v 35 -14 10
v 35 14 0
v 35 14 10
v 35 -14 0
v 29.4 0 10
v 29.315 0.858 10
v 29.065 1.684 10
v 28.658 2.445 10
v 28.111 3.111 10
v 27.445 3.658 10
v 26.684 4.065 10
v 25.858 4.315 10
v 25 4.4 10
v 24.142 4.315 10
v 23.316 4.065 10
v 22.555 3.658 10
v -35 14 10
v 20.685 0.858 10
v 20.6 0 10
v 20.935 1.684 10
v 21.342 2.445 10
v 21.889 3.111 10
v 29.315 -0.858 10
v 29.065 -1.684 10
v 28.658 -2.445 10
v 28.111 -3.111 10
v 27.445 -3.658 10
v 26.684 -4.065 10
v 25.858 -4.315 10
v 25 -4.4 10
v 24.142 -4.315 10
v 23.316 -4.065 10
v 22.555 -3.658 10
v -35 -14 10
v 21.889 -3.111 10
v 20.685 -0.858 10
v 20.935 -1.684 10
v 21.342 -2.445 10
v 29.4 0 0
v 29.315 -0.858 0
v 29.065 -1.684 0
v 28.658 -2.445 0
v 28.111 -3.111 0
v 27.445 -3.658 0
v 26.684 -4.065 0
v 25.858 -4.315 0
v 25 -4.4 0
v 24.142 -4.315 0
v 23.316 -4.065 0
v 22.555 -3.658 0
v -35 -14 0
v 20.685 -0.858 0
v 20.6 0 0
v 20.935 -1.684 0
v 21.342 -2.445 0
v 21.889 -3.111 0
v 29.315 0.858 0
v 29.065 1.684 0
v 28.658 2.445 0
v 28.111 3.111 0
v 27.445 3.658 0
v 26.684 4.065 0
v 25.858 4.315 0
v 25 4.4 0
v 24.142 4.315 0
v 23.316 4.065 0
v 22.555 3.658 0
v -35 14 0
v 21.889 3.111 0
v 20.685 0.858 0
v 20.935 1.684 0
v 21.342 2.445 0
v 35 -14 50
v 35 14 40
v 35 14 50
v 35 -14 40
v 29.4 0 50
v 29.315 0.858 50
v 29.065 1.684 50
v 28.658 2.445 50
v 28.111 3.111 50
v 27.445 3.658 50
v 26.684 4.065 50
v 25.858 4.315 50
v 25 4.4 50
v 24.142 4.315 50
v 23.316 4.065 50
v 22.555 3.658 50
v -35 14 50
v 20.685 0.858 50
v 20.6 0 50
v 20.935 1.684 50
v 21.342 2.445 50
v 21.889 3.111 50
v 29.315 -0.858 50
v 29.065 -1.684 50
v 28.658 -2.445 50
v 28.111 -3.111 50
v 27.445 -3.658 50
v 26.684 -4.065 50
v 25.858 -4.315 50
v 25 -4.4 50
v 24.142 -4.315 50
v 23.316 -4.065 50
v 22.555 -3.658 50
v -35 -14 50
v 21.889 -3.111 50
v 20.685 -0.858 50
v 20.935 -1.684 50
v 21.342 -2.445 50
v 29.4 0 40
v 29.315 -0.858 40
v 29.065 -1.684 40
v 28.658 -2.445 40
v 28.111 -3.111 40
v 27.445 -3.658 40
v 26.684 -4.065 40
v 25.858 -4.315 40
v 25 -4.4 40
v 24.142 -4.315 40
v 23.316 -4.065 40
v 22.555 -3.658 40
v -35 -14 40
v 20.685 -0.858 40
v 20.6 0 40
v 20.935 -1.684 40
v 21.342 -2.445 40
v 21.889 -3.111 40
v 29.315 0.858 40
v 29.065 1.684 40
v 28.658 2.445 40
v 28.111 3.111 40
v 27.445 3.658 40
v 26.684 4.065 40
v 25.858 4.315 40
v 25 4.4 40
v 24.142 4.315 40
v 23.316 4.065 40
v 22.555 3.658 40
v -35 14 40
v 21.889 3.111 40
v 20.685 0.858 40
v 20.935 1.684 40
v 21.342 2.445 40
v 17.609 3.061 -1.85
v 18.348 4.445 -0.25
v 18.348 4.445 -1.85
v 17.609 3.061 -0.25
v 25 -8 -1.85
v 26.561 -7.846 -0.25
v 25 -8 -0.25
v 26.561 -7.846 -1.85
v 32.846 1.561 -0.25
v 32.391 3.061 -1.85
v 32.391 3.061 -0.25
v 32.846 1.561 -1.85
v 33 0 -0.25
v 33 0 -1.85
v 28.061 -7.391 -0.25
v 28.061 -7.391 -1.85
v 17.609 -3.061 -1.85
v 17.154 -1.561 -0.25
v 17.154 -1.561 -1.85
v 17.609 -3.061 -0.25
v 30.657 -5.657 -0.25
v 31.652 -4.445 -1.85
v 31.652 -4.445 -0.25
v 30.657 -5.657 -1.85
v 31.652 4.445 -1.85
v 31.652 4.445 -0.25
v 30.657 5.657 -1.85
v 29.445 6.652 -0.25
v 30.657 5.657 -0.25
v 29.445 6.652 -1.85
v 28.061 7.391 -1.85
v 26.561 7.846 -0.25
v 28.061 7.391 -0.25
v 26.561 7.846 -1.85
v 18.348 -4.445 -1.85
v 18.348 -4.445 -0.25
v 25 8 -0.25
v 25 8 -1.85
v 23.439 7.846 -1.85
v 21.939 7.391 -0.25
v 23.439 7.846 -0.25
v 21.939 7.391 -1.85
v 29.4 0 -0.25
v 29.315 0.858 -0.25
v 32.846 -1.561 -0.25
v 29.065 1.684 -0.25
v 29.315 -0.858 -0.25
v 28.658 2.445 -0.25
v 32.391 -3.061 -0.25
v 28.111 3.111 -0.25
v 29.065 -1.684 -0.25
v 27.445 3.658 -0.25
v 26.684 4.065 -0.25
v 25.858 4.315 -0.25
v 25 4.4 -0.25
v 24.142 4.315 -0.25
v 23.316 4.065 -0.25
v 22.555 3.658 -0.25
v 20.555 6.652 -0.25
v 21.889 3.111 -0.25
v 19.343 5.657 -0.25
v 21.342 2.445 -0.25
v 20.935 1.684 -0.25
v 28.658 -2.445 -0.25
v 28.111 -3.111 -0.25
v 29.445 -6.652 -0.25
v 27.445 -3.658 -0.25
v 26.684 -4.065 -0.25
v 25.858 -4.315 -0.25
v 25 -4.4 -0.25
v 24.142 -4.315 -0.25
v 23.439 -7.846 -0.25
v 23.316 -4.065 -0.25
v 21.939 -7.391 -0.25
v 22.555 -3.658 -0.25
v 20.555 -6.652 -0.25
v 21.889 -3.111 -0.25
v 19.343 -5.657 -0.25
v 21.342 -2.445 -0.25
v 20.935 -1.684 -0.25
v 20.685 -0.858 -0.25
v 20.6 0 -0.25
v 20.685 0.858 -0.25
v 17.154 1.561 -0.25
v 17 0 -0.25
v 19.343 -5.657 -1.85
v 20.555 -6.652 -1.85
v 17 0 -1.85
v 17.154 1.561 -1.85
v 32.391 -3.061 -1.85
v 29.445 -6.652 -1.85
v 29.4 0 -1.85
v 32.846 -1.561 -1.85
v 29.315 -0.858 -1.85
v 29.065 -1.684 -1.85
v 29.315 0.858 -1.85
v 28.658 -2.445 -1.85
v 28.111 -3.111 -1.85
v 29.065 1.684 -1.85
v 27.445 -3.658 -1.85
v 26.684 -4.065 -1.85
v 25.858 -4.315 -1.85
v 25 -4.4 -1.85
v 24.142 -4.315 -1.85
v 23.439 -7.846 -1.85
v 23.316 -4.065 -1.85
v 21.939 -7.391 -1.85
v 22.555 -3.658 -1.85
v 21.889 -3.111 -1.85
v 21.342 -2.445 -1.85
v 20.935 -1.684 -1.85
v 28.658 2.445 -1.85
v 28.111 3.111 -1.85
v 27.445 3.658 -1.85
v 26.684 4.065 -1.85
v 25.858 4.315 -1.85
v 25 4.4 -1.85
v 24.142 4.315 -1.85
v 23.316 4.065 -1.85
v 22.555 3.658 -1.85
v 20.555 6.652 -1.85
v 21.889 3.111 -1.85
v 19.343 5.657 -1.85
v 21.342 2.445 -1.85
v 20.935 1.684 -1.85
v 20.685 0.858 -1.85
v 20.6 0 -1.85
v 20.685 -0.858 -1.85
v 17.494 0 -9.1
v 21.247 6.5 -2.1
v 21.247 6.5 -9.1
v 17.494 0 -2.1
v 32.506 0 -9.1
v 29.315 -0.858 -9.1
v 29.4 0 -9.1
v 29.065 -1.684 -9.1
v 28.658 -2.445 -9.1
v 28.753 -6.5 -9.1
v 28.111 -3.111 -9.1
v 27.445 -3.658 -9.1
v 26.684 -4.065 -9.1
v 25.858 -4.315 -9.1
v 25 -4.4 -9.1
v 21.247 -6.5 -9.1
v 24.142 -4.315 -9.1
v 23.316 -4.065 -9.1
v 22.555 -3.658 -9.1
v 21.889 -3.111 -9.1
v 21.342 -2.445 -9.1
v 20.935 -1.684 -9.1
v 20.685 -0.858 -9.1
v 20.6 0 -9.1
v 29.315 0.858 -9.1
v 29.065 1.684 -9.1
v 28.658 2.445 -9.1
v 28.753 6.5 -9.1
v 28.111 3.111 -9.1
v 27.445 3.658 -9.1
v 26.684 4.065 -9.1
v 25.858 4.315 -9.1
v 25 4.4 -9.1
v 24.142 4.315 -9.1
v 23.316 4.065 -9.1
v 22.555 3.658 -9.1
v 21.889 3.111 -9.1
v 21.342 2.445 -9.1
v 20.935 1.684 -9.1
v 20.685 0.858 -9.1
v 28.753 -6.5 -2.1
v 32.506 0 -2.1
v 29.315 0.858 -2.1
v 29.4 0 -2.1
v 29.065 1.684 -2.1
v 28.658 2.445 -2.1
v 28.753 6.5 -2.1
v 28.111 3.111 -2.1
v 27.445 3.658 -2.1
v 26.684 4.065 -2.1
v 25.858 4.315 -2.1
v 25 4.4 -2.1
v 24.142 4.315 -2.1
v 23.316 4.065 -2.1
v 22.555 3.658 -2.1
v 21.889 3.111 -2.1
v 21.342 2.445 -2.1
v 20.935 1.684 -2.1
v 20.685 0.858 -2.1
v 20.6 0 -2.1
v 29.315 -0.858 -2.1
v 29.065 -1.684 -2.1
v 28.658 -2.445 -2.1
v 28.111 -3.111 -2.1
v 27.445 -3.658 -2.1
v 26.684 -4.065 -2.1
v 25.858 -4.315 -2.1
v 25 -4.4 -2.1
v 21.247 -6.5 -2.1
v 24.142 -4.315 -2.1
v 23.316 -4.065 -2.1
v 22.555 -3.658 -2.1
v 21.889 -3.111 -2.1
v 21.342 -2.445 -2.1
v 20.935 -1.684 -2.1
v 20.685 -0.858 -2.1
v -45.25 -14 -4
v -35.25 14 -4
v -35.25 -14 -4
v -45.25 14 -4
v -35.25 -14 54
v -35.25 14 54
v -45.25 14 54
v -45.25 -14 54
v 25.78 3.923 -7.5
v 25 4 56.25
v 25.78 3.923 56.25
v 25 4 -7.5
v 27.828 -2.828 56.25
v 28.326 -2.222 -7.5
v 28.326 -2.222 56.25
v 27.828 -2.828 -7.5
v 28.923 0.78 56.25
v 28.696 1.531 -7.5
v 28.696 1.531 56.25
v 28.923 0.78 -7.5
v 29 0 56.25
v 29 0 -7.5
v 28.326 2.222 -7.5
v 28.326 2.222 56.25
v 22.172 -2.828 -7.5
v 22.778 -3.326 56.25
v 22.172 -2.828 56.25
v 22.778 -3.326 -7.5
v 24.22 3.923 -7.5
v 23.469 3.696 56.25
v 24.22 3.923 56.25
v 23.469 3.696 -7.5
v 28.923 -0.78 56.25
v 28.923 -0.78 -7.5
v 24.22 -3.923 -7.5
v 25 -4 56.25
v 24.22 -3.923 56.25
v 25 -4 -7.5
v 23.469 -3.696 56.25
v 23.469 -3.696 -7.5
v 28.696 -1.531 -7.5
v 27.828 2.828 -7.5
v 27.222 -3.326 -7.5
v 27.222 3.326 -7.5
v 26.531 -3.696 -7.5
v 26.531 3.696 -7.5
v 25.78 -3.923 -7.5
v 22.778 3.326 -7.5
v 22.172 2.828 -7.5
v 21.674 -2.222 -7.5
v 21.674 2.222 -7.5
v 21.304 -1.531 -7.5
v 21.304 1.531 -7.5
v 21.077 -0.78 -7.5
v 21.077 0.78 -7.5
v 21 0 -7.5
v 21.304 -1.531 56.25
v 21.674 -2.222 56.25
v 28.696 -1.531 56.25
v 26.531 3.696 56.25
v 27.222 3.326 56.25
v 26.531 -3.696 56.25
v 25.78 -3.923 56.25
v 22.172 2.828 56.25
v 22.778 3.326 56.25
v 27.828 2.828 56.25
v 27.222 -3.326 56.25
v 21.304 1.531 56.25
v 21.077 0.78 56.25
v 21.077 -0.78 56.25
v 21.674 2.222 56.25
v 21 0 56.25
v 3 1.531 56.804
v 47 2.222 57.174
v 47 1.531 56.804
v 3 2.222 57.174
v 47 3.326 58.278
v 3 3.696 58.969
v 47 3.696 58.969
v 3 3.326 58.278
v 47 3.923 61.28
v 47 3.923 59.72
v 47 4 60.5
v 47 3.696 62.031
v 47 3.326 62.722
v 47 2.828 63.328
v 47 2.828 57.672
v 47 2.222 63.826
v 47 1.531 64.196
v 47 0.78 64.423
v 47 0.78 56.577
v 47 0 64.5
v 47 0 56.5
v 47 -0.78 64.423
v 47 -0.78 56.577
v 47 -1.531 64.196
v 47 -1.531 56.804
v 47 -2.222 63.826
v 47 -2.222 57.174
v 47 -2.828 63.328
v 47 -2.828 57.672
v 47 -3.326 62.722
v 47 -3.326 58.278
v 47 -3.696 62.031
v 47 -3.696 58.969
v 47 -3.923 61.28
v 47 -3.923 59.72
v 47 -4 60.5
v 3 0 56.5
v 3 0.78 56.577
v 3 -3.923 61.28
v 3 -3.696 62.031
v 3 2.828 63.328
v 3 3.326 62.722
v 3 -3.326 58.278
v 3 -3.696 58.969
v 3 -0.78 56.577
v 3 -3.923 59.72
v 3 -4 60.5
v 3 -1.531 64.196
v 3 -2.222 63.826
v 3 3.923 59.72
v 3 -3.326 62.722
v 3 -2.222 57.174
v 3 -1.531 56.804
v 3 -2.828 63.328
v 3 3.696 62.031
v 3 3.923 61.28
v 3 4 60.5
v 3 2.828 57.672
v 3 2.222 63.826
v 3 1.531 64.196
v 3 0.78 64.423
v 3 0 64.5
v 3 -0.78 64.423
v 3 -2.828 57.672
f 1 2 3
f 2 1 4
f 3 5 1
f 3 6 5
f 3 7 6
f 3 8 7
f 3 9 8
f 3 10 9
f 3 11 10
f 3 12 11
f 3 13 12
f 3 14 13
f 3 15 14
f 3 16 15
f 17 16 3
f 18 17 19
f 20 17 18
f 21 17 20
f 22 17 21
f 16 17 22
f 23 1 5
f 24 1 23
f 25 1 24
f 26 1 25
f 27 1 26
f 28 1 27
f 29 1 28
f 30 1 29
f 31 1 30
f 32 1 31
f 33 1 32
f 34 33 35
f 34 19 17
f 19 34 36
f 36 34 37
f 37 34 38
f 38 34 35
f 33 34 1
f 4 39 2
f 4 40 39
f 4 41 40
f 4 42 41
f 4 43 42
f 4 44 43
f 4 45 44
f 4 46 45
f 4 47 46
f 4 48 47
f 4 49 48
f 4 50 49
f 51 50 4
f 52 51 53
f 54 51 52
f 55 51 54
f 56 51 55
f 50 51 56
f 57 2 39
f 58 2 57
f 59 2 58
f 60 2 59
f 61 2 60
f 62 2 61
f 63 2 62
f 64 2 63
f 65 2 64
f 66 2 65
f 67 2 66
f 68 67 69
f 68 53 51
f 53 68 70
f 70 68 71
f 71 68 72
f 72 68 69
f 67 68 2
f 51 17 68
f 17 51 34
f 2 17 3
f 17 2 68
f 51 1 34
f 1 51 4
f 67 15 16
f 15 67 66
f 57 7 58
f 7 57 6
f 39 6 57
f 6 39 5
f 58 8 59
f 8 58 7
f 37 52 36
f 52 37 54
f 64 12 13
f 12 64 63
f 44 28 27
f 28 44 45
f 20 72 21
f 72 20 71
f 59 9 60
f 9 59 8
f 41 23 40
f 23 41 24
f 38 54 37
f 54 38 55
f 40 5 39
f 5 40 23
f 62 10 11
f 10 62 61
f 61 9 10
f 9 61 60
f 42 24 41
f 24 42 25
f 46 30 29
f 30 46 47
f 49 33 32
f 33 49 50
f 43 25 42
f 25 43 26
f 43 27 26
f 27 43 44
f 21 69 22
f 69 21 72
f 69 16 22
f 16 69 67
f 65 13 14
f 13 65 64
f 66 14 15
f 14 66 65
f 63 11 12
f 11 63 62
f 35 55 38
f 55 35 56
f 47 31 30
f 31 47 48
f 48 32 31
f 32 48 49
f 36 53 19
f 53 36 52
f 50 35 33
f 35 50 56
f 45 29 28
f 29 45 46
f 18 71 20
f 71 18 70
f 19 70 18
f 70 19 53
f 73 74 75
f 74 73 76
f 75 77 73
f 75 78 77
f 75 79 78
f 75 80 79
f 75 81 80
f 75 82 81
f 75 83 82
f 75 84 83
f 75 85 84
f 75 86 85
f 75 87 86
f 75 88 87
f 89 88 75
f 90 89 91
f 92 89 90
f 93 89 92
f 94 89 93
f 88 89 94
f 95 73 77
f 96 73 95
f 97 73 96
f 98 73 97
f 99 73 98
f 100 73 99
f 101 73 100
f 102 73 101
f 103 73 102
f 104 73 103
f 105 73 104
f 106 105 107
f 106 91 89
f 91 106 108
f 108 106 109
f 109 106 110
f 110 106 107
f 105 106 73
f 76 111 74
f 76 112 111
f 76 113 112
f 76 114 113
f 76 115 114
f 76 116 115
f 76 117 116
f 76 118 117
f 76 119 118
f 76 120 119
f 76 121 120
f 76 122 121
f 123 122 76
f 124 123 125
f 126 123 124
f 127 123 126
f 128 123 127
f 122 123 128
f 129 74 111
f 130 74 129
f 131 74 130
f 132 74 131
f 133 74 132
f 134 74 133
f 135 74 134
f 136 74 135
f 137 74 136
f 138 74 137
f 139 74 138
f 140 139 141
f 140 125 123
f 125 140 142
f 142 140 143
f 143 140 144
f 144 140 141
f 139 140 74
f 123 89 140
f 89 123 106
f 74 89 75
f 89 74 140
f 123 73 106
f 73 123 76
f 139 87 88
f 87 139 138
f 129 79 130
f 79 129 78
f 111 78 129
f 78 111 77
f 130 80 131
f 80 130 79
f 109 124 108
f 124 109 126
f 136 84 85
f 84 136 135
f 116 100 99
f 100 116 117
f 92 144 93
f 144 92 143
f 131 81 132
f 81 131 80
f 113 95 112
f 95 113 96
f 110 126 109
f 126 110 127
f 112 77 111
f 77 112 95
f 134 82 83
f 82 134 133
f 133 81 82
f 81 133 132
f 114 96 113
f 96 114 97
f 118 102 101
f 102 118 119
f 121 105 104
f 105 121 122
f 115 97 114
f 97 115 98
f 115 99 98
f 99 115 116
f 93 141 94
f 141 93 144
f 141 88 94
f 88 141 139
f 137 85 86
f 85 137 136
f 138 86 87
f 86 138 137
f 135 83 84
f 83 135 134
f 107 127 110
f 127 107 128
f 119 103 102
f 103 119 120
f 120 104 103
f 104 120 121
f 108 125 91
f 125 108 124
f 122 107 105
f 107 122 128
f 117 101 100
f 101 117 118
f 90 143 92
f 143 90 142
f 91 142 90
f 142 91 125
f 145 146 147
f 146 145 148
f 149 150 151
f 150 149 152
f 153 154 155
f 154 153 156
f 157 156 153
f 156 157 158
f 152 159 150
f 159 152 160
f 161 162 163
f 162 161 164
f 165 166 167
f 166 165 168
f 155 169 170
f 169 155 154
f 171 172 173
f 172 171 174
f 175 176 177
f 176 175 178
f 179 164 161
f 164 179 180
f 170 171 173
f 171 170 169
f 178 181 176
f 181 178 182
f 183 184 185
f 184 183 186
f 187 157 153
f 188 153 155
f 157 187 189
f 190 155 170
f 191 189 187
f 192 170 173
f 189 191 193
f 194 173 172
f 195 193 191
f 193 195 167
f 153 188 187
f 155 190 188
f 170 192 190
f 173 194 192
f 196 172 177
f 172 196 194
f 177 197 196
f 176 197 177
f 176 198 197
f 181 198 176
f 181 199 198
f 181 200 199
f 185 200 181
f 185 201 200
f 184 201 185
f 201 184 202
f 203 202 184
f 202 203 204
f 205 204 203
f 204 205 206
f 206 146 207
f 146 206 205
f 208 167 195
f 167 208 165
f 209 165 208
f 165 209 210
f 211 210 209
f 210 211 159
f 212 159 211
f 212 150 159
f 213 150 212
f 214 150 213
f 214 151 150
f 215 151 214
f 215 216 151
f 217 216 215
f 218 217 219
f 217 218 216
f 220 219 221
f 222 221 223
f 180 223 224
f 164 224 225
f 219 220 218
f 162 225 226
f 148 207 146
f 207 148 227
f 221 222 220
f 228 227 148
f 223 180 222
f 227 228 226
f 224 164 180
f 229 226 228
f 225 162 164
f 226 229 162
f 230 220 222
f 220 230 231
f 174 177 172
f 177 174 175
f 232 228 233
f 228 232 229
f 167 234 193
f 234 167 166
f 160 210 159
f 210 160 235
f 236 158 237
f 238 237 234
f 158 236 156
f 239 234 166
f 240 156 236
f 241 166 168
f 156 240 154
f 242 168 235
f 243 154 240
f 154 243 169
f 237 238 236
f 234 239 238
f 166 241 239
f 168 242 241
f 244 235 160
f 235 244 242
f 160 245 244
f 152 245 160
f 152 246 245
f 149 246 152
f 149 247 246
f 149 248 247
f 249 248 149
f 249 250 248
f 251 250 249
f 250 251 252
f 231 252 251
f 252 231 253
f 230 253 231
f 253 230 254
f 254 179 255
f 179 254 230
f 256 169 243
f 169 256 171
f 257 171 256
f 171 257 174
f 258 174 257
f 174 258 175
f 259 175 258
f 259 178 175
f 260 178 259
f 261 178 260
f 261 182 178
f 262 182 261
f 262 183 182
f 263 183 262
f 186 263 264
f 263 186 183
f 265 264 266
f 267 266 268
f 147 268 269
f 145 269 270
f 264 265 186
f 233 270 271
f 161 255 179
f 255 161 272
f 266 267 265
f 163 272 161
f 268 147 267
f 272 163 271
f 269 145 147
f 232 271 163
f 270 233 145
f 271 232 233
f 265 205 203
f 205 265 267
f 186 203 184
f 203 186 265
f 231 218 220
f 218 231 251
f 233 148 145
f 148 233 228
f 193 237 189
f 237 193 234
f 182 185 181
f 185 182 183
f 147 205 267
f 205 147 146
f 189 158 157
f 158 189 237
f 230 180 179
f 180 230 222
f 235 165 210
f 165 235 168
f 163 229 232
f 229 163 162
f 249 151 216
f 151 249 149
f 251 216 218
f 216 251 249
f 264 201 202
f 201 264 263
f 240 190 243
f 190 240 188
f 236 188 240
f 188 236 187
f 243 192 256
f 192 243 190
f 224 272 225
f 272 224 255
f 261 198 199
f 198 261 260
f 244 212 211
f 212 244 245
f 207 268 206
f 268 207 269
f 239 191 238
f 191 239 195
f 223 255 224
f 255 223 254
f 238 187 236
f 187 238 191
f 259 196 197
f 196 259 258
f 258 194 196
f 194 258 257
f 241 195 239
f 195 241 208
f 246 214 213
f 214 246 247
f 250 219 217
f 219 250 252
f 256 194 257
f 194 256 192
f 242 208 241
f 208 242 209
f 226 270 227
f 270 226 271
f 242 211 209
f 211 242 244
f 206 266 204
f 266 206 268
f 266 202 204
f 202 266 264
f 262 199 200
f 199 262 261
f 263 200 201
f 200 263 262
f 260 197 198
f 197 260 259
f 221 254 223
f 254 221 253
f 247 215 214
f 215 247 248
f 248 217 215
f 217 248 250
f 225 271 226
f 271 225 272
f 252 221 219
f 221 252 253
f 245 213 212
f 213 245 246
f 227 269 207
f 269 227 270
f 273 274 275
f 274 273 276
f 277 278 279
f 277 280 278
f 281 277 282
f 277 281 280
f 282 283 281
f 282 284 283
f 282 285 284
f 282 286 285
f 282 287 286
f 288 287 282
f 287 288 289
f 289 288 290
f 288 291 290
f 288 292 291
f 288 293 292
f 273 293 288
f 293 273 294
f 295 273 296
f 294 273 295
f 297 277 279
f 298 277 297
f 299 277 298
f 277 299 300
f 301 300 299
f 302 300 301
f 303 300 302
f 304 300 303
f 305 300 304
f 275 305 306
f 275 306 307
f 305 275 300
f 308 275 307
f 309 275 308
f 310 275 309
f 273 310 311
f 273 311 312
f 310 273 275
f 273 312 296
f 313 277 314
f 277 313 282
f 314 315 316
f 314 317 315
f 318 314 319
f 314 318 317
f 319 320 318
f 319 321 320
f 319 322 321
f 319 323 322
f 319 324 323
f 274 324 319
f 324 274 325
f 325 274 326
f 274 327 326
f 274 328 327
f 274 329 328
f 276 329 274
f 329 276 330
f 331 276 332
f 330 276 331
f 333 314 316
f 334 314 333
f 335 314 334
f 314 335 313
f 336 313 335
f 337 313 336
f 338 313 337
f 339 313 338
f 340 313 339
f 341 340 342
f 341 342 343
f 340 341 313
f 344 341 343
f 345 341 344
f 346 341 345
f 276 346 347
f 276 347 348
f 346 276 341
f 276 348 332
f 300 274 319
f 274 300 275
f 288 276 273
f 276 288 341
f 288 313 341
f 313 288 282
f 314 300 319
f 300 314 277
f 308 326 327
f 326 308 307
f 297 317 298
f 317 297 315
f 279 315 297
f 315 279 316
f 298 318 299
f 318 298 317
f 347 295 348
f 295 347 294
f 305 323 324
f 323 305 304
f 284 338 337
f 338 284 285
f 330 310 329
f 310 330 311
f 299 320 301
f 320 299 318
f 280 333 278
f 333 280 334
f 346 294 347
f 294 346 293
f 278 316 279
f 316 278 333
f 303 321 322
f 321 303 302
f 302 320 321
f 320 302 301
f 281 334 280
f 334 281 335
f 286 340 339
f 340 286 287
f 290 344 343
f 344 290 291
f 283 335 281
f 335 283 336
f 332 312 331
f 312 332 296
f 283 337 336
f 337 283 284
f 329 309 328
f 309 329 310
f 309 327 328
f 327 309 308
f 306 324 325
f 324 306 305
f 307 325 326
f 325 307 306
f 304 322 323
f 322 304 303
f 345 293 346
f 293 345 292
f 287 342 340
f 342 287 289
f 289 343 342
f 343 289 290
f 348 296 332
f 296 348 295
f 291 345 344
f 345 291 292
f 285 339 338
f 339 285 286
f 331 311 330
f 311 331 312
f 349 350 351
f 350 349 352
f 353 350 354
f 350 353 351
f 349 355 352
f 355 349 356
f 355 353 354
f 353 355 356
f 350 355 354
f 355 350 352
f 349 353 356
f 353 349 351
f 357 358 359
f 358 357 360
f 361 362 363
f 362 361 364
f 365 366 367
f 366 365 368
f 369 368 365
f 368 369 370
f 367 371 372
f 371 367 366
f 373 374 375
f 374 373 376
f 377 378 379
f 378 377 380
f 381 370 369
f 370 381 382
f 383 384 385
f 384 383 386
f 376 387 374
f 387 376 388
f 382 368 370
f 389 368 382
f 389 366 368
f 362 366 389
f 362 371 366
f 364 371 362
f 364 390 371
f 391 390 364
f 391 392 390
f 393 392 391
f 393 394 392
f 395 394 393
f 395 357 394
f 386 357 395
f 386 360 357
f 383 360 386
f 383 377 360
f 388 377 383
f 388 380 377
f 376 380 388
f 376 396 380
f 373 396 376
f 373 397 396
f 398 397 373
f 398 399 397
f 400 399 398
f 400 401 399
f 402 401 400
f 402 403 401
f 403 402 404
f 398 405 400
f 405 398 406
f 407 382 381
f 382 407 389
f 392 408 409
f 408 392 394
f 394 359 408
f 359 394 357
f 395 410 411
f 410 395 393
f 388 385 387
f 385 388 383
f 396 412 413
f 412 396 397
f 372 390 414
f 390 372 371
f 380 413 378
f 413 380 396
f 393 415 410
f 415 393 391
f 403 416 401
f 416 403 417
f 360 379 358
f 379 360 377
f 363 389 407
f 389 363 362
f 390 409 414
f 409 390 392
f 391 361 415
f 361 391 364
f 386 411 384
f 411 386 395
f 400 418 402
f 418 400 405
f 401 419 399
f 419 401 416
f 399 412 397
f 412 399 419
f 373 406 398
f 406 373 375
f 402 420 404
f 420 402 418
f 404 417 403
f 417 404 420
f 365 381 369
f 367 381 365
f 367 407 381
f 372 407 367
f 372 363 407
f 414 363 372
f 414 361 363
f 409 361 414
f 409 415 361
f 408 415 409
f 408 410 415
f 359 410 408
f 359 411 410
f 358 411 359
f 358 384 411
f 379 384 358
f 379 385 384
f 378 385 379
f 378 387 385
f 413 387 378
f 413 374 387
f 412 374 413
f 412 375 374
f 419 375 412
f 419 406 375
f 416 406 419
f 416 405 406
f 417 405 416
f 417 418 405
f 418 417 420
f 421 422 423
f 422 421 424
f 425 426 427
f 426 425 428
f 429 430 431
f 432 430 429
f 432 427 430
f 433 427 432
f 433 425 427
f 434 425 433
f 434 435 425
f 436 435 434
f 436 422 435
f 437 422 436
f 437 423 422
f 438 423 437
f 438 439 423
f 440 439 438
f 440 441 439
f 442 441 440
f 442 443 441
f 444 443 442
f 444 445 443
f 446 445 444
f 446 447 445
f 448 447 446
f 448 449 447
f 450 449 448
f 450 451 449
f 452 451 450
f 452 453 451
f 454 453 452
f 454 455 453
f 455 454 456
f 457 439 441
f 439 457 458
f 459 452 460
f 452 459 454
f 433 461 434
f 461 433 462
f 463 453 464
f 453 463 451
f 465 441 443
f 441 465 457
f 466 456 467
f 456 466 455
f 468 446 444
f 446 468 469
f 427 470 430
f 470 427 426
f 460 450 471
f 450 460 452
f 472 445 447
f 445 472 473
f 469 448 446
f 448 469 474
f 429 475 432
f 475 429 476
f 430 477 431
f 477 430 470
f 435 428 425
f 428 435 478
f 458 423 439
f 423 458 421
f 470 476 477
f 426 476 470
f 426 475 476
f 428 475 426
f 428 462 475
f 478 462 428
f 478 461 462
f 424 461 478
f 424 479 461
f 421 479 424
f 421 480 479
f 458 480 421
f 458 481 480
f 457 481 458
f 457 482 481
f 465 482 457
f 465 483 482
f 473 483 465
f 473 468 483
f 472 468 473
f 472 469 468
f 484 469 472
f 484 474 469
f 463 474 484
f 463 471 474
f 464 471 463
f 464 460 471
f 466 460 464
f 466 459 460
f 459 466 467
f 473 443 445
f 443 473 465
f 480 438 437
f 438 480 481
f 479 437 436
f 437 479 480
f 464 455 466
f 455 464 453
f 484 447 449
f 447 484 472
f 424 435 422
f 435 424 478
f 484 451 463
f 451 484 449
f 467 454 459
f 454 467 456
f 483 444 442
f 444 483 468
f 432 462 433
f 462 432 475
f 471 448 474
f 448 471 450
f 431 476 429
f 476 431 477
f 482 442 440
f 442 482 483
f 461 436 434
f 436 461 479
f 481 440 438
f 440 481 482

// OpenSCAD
$fn = 32;

// ------------------------------------------------------------------------
// C clamp: throat 40 mm, screw d8
// Every part is its own module, assembly() places every instance.
// ------------------------------------------------------------------------

// --- part 1 ---
module clamp_arm() {
  difference() {
    translate([-35, -14, 0]) cube([70, 28, 10]);
    translate([25, 0, -1]) cylinder(h = 12, d = 8.8);
  }
}

// --- part 2 ---
module clamp_spine() {
  difference() {
    translate([-29, -14, 0]) cube([58, 28, 10]);
  }
}

// --- part 3 ---
module clamp_screw() {
  translate([0, 0, -31.875]) cylinder(h = 63.75, d = 8);
}

// --- part 4 ---
module clamp_washer() {
  difference() {
      translate([0, 0, 0]) cylinder(h = 1.6, d = 16);
      translate([0, 0, -1]) cylinder(h = 3.6, d = 8.8);
    }
}

// --- part 5 ---
module clamp_nut() {
  difference() {
    linear_extrude(height = 7) polygon(points = [[7.506, 0], [3.753, 6.5], [-3.753, 6.5], [-7.506, 0], [-3.753, -6.5], [3.753, -6.5]]);
    translate([0, 0, -1]) cylinder(h = 9, d = 8.8);
  }
}

// --- part 6 ---
module tommy_bar() {
  translate([0, 0, -22]) cylinder(h = 44, d = 8);
}

// --- assembly ---
module assembly() {
  color([0.80, 0.24, 0.20]) translate([0, 0, 0]) rotate([0, 0, 0]) clamp_arm();
  color([0.20, 0.45, 0.75]) translate([0, 0, 40]) rotate([0, 0, 0]) clamp_arm();
  color([0.25, 0.62, 0.32]) translate([-45.25, 0, 25]) rotate([0, 90, 0]) clamp_spine();
  color([0.92, 0.70, 0.18]) translate([25, 0, 24.375]) rotate([0, 0, 0]) clamp_screw();
  color([0.58, 0.35, 0.70]) translate([25, 0, -1.85]) rotate([0, 0, 0]) clamp_washer();
  color([0.16, 0.66, 0.66]) translate([25, 0, -9.1]) rotate([0, 0, 0]) clamp_nut();
  color([0.85, 0.48, 0.18]) translate([25, 0, 60.5]) rotate([0, 90, 0]) tommy_bar();
}

assembly();
